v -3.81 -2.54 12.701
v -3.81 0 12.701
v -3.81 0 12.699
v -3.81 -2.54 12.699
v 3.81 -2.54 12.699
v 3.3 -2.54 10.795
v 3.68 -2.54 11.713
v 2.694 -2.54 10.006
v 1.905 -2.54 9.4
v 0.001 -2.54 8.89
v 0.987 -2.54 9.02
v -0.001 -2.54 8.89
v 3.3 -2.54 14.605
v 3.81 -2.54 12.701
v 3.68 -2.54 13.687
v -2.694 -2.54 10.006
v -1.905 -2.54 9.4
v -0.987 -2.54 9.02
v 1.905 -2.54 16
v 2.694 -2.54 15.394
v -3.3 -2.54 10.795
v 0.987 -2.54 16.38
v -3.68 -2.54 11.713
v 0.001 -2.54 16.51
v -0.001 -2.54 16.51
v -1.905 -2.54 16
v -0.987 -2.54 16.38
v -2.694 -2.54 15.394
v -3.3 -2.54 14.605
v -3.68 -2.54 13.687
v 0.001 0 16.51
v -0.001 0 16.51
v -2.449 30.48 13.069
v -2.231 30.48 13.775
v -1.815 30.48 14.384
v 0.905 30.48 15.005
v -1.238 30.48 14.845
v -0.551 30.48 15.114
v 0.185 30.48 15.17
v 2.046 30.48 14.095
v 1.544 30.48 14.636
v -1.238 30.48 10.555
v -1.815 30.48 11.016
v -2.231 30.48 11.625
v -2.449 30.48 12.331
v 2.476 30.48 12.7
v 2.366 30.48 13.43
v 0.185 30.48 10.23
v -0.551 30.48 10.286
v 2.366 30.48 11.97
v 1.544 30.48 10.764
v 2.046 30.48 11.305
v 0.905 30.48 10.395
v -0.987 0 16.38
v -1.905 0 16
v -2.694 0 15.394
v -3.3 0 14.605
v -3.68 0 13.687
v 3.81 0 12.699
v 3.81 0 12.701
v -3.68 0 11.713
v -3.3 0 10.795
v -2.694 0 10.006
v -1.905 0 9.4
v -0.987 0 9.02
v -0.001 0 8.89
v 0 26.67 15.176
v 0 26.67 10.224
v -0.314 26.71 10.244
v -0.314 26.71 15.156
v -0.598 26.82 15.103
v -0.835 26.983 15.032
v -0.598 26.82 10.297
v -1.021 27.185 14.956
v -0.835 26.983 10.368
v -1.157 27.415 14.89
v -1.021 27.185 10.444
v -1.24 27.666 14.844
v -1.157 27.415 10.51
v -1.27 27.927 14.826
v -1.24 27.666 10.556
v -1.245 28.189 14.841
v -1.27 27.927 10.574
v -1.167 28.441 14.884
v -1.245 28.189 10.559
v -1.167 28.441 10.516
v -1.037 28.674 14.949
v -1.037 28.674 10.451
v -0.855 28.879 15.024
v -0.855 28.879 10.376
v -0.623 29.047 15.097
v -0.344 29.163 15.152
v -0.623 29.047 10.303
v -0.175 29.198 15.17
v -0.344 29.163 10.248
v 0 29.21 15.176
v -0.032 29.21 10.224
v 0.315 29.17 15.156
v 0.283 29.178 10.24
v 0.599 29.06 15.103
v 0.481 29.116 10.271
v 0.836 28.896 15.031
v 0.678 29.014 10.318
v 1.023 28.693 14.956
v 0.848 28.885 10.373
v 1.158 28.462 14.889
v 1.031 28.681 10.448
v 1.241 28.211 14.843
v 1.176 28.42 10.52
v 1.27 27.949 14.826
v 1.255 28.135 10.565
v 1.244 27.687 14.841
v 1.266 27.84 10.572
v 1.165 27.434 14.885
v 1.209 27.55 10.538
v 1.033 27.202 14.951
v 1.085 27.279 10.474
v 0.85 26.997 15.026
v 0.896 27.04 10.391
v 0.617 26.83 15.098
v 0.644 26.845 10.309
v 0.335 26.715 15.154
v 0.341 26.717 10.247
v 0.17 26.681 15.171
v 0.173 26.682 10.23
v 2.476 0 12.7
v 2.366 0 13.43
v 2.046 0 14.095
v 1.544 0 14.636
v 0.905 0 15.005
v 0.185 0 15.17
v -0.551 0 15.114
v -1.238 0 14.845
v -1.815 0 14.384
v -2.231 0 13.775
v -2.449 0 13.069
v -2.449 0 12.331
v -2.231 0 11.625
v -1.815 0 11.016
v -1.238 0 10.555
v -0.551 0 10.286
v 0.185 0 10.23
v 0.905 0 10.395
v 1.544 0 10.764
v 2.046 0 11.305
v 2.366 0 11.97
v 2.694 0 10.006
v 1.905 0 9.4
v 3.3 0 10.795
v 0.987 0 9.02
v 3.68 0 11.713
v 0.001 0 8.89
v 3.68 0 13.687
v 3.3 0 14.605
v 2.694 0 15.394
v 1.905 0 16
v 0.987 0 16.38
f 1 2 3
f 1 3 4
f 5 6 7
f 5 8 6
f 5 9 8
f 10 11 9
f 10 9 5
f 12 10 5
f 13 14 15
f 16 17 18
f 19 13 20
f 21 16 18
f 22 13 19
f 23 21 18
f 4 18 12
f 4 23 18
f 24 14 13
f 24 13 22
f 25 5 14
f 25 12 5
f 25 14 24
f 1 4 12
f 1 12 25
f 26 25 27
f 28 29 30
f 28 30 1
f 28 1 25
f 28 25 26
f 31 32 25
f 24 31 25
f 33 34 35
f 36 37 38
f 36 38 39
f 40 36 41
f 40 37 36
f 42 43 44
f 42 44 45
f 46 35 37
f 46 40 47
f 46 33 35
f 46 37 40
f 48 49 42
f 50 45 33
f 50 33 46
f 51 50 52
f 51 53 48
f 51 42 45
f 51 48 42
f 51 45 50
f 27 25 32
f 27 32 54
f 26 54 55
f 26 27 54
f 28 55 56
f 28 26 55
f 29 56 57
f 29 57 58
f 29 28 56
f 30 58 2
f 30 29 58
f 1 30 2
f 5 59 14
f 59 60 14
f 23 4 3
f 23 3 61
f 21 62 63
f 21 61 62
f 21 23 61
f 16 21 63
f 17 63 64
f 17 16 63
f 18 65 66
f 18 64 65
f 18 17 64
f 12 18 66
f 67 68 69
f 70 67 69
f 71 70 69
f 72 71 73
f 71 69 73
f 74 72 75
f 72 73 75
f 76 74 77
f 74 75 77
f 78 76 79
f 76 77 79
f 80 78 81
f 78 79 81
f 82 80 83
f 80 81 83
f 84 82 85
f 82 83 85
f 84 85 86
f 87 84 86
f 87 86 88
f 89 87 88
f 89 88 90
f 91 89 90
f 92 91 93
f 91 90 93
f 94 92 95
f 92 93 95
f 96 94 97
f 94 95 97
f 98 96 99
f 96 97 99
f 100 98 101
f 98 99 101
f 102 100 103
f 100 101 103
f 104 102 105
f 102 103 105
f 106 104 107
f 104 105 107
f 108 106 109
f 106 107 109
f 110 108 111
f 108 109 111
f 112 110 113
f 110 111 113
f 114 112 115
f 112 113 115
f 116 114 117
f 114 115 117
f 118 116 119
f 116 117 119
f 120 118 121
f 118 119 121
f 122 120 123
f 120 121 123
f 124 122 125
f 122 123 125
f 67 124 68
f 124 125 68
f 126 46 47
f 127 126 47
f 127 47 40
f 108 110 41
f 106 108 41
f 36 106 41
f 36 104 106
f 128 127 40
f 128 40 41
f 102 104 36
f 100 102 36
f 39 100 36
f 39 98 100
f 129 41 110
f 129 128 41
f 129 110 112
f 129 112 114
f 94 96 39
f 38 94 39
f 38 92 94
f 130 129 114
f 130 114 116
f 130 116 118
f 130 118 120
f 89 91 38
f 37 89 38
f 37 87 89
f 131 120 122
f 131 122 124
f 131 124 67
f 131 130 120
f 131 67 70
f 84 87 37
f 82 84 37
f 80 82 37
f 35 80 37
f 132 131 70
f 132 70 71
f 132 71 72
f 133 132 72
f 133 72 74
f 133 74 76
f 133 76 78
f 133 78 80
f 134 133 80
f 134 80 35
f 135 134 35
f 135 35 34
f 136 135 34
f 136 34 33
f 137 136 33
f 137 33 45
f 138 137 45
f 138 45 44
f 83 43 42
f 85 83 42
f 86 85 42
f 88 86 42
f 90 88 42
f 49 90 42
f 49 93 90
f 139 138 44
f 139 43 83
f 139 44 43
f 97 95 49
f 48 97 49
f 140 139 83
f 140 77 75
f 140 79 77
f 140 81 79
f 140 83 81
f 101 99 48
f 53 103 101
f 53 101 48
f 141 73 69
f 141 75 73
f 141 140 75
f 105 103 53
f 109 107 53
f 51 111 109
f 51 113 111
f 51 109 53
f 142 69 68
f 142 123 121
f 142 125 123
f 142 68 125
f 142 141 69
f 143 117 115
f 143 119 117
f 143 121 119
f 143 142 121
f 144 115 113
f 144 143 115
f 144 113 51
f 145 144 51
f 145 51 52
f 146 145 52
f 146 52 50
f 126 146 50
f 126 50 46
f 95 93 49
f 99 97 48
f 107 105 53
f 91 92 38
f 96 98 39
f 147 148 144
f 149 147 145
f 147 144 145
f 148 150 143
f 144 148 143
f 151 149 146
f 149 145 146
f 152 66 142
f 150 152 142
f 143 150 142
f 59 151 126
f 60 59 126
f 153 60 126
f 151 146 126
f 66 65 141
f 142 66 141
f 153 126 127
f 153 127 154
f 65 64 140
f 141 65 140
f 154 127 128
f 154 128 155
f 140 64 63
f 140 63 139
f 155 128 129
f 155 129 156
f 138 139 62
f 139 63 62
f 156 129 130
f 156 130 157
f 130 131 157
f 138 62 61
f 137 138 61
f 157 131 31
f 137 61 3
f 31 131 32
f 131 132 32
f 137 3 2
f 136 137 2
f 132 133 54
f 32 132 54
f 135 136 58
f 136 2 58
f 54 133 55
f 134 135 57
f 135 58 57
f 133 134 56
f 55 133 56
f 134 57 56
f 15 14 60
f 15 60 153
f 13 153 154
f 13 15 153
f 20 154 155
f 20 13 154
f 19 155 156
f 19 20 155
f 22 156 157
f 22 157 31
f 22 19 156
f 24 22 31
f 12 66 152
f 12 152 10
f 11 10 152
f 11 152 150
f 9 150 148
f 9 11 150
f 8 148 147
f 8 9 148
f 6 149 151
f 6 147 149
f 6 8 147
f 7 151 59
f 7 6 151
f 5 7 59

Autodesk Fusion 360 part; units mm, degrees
sketch "Sketch1" plane through (0, 0, 0) normal (0, 1, 0) x (1, 0, 0)
  circle A0 centre (0, -12.7) radius 2.4765
  dimension "d1" = 4.953
extrude "Extrude1" add sketch "Sketch1" along normal blind 30.48
hole "Hole1" at (0, 27.94, 15.1765) direction (0, 0, -1) diameter 2.54 depth 10.668 tip angle 118
sketch "Sketch2" plane through (0, 0, 0) normal (0, -1, 0) x (1, 0, 0)
  circle A0 centre (0, 12.7) radius 2.4765
  line L0 (-1.27, 11.43) -> (1.27, 11.43)
  line L1 (1.27, 11.43) -> (1.27, 13.97)
  line L2 (1.27, 13.97) -> (-1.27, 13.97)
  line L3 (-1.27, 13.97) -> (-1.27, 11.43)
extrude "Extrude2" add sketch "Sketch2" along normal blind 2.54 contours L0 L1 L2 L3
extrude "Extrude3" add 1 faces at (0.4233, -0.8467, 13.97) along direction (0, 0, 1) blind 2.54
extrude "Extrude4" add 1 faces at (-0.4233, -0.8467, 11.43) along direction (0, 0, -1) blind 2.54
extrude "Extrude5" add 1 faces at (-1.27, -1.6933, 11.9913) along direction (-1, 0, 0) blind 2.54
extrude "Extrude6" add 1 faces at (1.27, -1.6933, 11.9913) along direction (1, 0, 0) blind 2.54
fillet "Fillet1" radius 3.81 4 edges at (-3.81, -1.27, 16.51) (3.81, -1.27, 16.51) (3.81, -1.27, 8.89) (-3.81, -1.27, 8.89)
